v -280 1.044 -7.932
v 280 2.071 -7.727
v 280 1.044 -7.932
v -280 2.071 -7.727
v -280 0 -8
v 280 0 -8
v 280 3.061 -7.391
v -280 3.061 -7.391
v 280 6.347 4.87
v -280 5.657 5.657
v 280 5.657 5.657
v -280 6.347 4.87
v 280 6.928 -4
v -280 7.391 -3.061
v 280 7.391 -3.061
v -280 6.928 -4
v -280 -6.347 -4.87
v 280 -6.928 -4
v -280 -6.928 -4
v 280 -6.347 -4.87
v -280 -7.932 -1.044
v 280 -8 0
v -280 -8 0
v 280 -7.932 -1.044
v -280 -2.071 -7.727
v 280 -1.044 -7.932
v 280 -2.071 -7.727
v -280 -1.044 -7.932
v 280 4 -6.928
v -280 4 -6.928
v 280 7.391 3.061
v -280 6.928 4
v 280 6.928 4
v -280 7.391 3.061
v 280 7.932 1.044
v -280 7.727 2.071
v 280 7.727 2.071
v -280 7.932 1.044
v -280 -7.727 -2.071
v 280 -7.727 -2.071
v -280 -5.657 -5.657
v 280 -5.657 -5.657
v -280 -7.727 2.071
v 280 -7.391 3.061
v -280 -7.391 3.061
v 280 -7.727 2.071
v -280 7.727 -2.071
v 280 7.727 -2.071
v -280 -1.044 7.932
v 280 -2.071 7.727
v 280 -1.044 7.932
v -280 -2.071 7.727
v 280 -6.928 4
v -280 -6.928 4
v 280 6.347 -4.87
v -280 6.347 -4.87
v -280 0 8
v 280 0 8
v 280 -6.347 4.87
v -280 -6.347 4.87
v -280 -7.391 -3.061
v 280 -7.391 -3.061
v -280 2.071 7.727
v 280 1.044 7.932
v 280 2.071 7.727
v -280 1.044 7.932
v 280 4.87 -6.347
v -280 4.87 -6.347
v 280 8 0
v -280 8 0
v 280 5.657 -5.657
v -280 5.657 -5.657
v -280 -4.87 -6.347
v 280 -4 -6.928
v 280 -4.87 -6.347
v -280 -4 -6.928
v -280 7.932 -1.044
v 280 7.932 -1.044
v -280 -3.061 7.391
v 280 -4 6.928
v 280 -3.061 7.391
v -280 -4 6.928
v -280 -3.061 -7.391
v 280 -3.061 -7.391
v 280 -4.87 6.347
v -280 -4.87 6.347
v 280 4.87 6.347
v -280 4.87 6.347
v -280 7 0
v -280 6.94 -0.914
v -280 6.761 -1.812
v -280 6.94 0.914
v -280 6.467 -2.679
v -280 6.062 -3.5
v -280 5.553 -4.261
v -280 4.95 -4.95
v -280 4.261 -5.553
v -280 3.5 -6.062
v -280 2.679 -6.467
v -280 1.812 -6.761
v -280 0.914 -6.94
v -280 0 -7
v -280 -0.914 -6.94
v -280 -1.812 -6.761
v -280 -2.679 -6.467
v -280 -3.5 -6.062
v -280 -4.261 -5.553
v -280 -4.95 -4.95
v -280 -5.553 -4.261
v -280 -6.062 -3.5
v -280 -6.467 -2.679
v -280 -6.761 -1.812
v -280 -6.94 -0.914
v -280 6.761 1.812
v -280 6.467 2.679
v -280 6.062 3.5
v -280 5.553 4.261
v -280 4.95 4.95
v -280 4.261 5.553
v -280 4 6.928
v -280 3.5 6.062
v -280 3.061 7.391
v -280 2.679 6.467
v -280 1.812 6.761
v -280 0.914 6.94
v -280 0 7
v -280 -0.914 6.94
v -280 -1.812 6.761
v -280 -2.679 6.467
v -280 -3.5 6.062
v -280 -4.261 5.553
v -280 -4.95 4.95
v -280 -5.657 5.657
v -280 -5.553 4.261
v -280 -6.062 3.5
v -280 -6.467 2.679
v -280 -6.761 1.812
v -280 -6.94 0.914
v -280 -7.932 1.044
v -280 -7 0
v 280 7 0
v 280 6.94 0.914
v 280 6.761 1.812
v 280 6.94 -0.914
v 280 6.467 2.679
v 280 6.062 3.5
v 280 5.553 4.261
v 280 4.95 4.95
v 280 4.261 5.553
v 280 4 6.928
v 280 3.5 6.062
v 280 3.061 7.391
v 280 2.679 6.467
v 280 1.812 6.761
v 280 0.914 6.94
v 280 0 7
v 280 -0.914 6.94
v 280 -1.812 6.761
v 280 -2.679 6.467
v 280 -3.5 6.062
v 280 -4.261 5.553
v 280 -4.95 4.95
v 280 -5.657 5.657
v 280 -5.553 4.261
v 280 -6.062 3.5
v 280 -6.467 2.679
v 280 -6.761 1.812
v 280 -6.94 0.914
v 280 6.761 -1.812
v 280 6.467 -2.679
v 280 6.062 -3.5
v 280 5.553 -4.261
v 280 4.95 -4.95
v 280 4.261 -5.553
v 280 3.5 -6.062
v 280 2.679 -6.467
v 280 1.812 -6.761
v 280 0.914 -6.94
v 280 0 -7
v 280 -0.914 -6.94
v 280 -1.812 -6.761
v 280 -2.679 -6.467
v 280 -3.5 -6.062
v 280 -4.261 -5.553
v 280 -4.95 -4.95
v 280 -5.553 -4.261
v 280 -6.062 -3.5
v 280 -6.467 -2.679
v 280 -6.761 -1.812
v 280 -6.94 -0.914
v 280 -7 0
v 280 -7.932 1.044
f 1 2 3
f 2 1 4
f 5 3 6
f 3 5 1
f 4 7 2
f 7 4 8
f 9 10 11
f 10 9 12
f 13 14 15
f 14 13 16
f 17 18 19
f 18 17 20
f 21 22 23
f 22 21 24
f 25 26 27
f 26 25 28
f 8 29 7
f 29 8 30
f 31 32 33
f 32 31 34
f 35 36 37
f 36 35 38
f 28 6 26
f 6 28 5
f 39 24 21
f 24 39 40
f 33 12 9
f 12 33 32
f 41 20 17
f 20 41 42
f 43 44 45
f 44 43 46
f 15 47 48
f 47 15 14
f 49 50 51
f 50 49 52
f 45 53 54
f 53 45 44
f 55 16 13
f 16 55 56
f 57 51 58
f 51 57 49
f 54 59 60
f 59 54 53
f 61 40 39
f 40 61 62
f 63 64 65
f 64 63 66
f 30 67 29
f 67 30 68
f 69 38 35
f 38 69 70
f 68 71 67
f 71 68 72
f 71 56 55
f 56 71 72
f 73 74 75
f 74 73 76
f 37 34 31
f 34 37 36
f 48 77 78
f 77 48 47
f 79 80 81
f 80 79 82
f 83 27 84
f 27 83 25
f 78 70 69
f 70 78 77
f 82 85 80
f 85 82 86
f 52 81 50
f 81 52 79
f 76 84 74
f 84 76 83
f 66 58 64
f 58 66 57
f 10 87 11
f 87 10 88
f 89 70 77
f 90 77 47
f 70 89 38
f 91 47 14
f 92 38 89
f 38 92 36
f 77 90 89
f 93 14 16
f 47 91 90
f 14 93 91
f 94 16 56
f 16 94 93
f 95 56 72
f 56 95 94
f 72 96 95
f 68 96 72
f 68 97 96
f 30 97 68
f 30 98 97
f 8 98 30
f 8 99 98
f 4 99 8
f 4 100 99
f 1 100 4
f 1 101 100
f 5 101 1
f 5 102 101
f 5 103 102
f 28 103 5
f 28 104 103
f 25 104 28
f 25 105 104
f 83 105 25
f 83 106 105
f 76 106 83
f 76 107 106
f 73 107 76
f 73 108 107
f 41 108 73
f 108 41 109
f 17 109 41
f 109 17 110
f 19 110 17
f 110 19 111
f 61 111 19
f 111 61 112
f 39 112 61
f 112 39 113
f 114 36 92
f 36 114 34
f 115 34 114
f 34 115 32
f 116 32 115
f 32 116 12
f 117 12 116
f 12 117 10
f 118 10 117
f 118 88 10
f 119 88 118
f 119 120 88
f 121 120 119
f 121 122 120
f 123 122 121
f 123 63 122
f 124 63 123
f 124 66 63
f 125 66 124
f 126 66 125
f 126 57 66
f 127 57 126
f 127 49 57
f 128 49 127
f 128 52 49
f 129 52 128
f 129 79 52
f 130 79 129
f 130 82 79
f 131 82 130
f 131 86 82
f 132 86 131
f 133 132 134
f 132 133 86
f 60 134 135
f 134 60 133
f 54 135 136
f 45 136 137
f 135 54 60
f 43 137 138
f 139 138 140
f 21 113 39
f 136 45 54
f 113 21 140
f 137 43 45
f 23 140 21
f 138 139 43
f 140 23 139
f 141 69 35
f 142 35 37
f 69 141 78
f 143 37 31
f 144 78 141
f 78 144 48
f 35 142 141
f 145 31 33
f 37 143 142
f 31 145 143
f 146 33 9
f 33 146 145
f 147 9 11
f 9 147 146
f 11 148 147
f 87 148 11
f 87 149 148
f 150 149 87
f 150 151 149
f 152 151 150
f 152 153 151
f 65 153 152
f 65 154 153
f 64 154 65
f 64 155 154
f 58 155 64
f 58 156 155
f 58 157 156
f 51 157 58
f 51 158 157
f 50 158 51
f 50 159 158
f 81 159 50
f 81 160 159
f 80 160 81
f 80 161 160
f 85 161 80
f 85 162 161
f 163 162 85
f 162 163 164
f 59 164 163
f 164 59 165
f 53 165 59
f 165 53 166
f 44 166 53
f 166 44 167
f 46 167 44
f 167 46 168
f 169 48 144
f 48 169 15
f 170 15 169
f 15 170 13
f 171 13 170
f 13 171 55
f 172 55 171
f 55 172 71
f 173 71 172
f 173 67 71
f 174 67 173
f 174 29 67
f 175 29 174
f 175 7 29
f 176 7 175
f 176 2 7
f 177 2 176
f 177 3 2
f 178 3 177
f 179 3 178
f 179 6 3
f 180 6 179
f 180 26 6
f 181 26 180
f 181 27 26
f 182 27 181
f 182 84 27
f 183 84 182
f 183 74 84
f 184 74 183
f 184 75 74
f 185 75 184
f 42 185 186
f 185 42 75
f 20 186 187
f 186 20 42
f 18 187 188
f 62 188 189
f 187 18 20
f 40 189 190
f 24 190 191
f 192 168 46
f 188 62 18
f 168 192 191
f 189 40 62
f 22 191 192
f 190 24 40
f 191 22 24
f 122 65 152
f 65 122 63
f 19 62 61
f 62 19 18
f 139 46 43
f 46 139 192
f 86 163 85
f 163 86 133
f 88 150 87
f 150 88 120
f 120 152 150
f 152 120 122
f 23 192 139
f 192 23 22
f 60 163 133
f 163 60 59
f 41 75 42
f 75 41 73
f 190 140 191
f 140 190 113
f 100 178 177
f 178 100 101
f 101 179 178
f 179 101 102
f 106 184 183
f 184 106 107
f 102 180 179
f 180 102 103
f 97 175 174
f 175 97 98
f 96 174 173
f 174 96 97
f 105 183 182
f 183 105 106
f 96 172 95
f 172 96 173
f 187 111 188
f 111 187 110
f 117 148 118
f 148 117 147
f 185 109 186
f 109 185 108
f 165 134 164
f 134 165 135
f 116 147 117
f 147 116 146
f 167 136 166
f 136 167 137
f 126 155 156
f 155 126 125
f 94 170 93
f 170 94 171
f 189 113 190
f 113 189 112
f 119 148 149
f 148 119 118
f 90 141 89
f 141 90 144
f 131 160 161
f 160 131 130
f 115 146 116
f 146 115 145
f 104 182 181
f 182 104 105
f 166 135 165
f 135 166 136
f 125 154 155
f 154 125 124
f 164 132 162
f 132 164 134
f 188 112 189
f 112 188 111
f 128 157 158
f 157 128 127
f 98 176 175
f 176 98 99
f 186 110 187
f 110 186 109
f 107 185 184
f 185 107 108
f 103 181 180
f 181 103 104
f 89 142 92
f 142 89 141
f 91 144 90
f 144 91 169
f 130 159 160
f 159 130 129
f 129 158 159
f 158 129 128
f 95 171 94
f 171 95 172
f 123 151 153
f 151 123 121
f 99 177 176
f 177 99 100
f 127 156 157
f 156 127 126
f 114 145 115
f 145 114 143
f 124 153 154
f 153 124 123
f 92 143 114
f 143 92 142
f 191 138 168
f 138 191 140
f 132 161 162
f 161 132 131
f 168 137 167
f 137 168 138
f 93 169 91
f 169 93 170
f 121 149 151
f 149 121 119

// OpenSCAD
// file: ../common/ds_lib.scad
// DronSwarm · librería común de piezas del frame (S07-S08). Unidades: mm.
//
// Reglas (ADR-003): sin hull()/minkowski()/offset() — FreeCAD los convierte en malla y el STEP deja de ser un
// sólido válido. Las formas redondeadas se arman con uniones de cubos y cilindros. El importador CSG de FreeCAD
// también falla con booleanas 2D y con varios operandos agrupados bajo una sola transformación: cada grupo de
// agujeros debe ser hijo directo del difference(), con su propio translate.
//
// Interfaz de motor DronSwarm (DMI, ADR-011): placa con 4 ranuras radiales a 90°, de modo que el mismo soporte
// acepta varios patrones comerciales y, más adelante, el motor propio (S17+) se diseña para caer en el mismo rango.
//   DMI-S: 4×M3, círculo de tornillos Ø16-Ø25 (motores 28xx-41xx, ≤ 600 W)
//   DMI-L: 4×M4, círculo de tornillos Ø30-Ø42 (motores 50xx-70xx, ≤ 2 kW)

$fn = 48;

M3 = 3.3; M3_HEAD = 6.0; M3_NUT = 6.4;     // pasante, cabeza, tuerca (entre caras + juego)
M4 = 4.4; M4_HEAD = 7.5;
M5 = 5.4;

function dmi_bolt(iface) = iface == "L" ? M4 : M3;
function dmi_r(iface) = iface == "L" ? [15, 21] : [8, 12.5];   // radio mínimo y máximo de las ranuras
function dmi_plate_d(iface) = iface == "L" ? 56 : 36;
function dmi_center(iface) = iface == "L" ? 16 : 10;            // eje, seguro y paso de cables

// Rectángulo con esquinas redondeadas (2D) y su extrusión
module rrect2d(size, r) {
    r2 = min(r, size[0] / 2 - 0.01, size[1] / 2 - 0.01);
    union() {
        translate([r2, 0]) square([size[0] - 2 * r2, size[1]]);
        translate([0, r2]) square([size[0], size[1] - 2 * r2]);
        for (x = [r2, size[0] - r2], y = [r2, size[1] - r2]) translate([x, y]) circle(r = r2);
    }
}
// Caja redondeada con primitivas 3D (sin booleanas 2D: el importador CSG de FreeCAD falla con ellas)
module rbox(size, r) {
    r2 = min(r, size[0] / 2 - 0.01, size[1] / 2 - 0.01);
    union() {
        translate([r2, 0, 0]) cube([size[0] - 2 * r2, size[1], size[2]]);
        translate([0, r2, 0]) cube([size[0], size[1] - 2 * r2, size[2]]);
        for (x = [r2, size[0] - r2], y = [r2, size[1] - r2]) translate([x, y, 0]) cylinder(r = r2, h = size[2]);
    }
}
module crbox(size, r) { translate([-size[0] / 2, -size[1] / 2, 0]) rbox(size, r); }   // centrado en x/y

// Ranura (2D) entre dos puntos sobre el eje x
module slot2d(r0, r1, w) {
    union() {
        translate([r0, -w / 2]) square([r1 - r0, w]);
        translate([r0, 0]) circle(d = w);
        translate([r1, 0]) circle(d = w);
    }
}

// Agujeros de la interfaz de motor (para restar de una placa de espesor t)
module slot3d(r0, r1, w, h) {
    union() {
        translate([r0, -w / 2, 0]) cube([r1 - r0, w, h]);
        translate([r0, 0, 0]) cylinder(d = w, h = h);
        translate([r1, 0, 0]) cylinder(d = w, h = h);
    }
}
module dmi_holes(iface, t) {
    r = dmi_r(iface);
    translate([0, 0, -1]) union() {
        cylinder(d = dmi_center(iface), h = t + 2);
        for (a = [45, 135, 225, 315]) rotate(a) slot3d(r[0], r[1], dmi_bolt(iface), t + 2);
    }
}

// Soporte de motor en la punta del brazo: manguito sobre el tubo + placa DMI arriba
//   el tubo entra por -x; la placa queda centrada en el eje del motor (origen), cara superior en z = 0
module motor_mount(tube_d, iface = "S", sleeve = 34, wall = 3.5) {
    od = tube_d + 2 * wall;
    pd = dmi_plate_d(iface);
    pt = iface == "L" ? 6 : 4;
    zc = -pt - tube_d / 2 - 1;                 // eje del tubo bajo la placa
    difference() {
        union() {
            translate([0, 0, -pt]) cylinder(d = pd, h = pt);                         // placa DMI
            translate([-sleeve - pd / 2 + 6, 0, zc]) rotate([0, 90, 0])
                cylinder(d = od, h = sleeve + pd / 2 - 6 + 4);                       // manguito
            translate([-sleeve - pd / 2 + 6, -od / 2, zc]) cube([sleeve + pd / 2 - 2, od, -zc - pt + 0.01]);  // alma
            translate([-sleeve - pd / 2 + 6, -5, zc - od / 2 - 7]) cube([sleeve, 10, 8]);   // oreja de apriete
        }
        dmi_holes(iface, pt + 0.02, $fn = 32);
        translate([-sleeve - pd / 2 + 5, 0, zc]) rotate([0, 90, 0]) cylinder(d = tube_d + 0.3, h = sleeve + pd / 2 - 3); // tubo
        translate([-sleeve - pd / 2 + 4, -1, zc - od / 2 - 8]) cube([sleeve + 1, 2, od / 2 + 6]);   // ranura de apriete
        for (x = [0.3, 0.75]) translate([-sleeve - pd / 2 + 6 + x * sleeve, 0, zc - od / 2 - 3])
            rotate([90, 0, 0]) cylinder(d = M3, h = 30, center = true);                // tornillos de apriete
        translate([-pd / 2 - 2, 0, zc]) rotate([0, 90, 0]) cylinder(d = 7, h = pd);   // salida de cables del tubo
    }
}

// Bloque de brazo entre las dos placas centrales (impreso PA12-CF): sujeta el tubo y separa las placas.
//   el tubo sale por +x desde el origen; el bloque ocupa x ∈ [-len, 0], altura = gap
module arm_block(tube_d, gap, len = 40, width = 0, bolt = M3) {
    w = width > 0 ? width : tube_d + 14;
    difference() {
        translate([-len, -w / 2, 0]) rbox([len, w, gap], 2);
        translate([-len - 1, 0, gap / 2]) rotate([0, 90, 0]) cylinder(d = tube_d + 0.2, h = len + 2);   // tubo
        translate([-len - 1, -0.75, gap / 2]) cube([len + 2, 1.5, gap / 2 + 1]);                        // ranura de apriete
        for (p = arm_block_bolts(tube_d, len, w)) translate([p[0], p[1], -1]) cylinder(d = bolt, h = gap + 2);
        translate([-len * 0.5, 0, gap * 0.78]) rotate([90, 0, 0]) cylinder(d = M3, h = w + 2, center = true);  // apriete
    }
}
function arm_block_bolts(tube_d, len, w) =
    [for (x = [-len + 6, -6], y = [-(w / 2 - 3.6), w / 2 - 3.6]) [x, y]];

// Patrón de controladora de vuelo (agujeros M3 en cuadrado)
module fc_holes(pattern, t) {
    for (x = [-1, 1], y = [-1, 1]) translate([x * pattern / 2, y * pattern / 2, -1]) cylinder(d = M3, h = t + 2);
}
// file: ds_d_params.scad
// DS-D · parámetros generados por tools/cad/gen_cad_params.py el 2026-10-19
// desde engineering/data/results (spec v1). No editar a mano: regenerar. Unidades: mm, kg.

vehicle = "DS-D";
rotors = 6;
wheelbase = 1453;
arm_radius = 726.5;
prop_d = 660.4;
tube_od = 22;
tube_wall = 1.5;
arm_len = 545;
plate_d = 363.2;
plate_t = 3;
plate_gap = 28;
motor_iface = "L";
battery_dims = [220, 134.4, 76.2];
battery = "12S5P P42A";
leg_h = 420;
fold_arms = true;
mtow_kg = 15.61;
motor_mass_kg = 0.345;
fc_pattern = 30.5;
payload_box = [300, 240, 220];
payload_kg = 5;
// file: ds_d_frame.scad
// DS-D · geometría compartida del frame: posiciones derivadas de los parámetros (spec v1). Unidades: mm.
// Ejes: x adelante, y izquierda, z arriba. z = 0 es la cara superior de la placa inferior.
// Hexa con brazos desmontables (bloques con levas entre las placas, ADR-012), batería y carcasa arriba,
// mecanismo de liberación de la carga al centro abajo, tren de esquíes.

include <ds_d_params.scad>
use <../common/ds_lib.scad>
include <../common/ds_lib.scad>

arm_angles = [0, 60, 120, 180, 240, 300];      // igual que el SDF/PX4 (rotor 0 adelante)
// Brazos desmontables (ADR-012): el tubo entra en un bloque impreso entre las placas y se fija con 2 levas de
// apriete rápido; los cables del motor tienen un conector en el bloque. Se monta/desmonta sin herramientas.
block_len = 60;
block_w = tube_od + 20;
r_block_out = plate_d / 2 - 3;                  // cara exterior del bloque
tube_insert = 54;                               // el tubo entra hasta un tope interior
tube_z = plate_gap / 2;
tube_start = r_block_out - tube_insert;
tube_len = arm_radius - tube_start - 6;
mm_sleeve = 30;

// Arriba: batería transversal atrás y carcasa adelante. Abajo: liberación al centro, FPV adelante
battery_pos = [-60, 0];
housing_size = [130, 110, 62];
housing_pos = [90, 0];
housing_flange = 10;
housing_bolts = [for (x = [-1, 0, 1], y = [-1, 1]) [housing_pos[0] + x * (housing_size[0] / 2 + 6), y * (housing_size[1] / 2 + 6)]];   // fuera del canal de la junta
battery_tray_bolts = [for (x = [-1, 1], y = [-1, 1]) [battery_pos[0] + x * 50, y * 95]];
release_bolts = [for (x = [-1, 1], y = [-1, 1]) [x * 35, y * 20]];
cable_gland_pos = [housing_pos[0] - housing_size[0] / 2 + 20, 0];
fpv_pos = [plate_d / 2 - 30, 0];

// Tren de esquíes: 4 patas inclinadas desde la placa inferior hasta dos esquíes longitudinales (base ancha)
leg_x = 100;                                    // patas en x = ±leg_x
leg_y_top = 110;                                // arriba, bajo la placa
skid_y = 220;                                   // esquíes en y = ±skid_y
skid_len = 560;
gear_tube = 16;                                 // tubos Ø16×1
gear_wall = 1.0;
ground_z = -leg_h;
skid_z = ground_z + gear_tube / 2 + 6;          // eje del esquí (sobre su zapata de TPU de 6 mm)
gear_mount_h = 30;                              // soporte impreso bajo la placa
// pivotes: el del soporte (bajo la placa) y el de la T (eje del esquí); la pata va de uno a otro
pivot_top = [leg_y_top, -plate_t - 6];
pivot_bot = [skid_y, skid_z];
leg_dy = pivot_bot[0] - pivot_top[0];
leg_dz = pivot_top[1] - pivot_bot[1];
leg_tilt = atan(leg_dy / leg_dz);               // inclinación hacia afuera (en torno a x)
leg_in_top = 4;                                 // el tubo termina 4 mm antes del pivote del soporte
leg_in_bot = 10;                                // y 10 mm después del eje del esquí
leg_len = sqrt(leg_dy * leg_dy + leg_dz * leg_dz) - leg_in_top - leg_in_bot;
gear_mount_bolts = [for (sx = [-1, 1], sy = [-1, 1], d = [[-14, -10], [14, -10], [-14, 10], [14, 10]]) [sx * leg_x + d[0], sy * leg_y_top + d[1]]];

motor_d = motor_iface == "L" ? 62 : 38;
motor_h = motor_iface == "L" ? 36 : 26;
function block_bolts() = [for (x = [-block_len + 7, -block_len / 2, -7], y = [-1, 1]) [x, y * (block_w / 2 - 4.5)]];
// main file
// DS-D · esquí: tubo de carbono Ø16×1.5 × skid_len (×2). Local: eje x centrado en el origen.
include <ds_d_frame.scad>
module skid_tube() translate([-skid_len / 2, 0, 0]) rotate([0, 90, 0]) difference() {
    cylinder(d = gear_tube, h = skid_len, $fn = 48);
    translate([0, 0, -1]) cylinder(d = gear_tube - 2 * gear_wall, h = skid_len + 2, $fn = 48);
}
skid_tube();
